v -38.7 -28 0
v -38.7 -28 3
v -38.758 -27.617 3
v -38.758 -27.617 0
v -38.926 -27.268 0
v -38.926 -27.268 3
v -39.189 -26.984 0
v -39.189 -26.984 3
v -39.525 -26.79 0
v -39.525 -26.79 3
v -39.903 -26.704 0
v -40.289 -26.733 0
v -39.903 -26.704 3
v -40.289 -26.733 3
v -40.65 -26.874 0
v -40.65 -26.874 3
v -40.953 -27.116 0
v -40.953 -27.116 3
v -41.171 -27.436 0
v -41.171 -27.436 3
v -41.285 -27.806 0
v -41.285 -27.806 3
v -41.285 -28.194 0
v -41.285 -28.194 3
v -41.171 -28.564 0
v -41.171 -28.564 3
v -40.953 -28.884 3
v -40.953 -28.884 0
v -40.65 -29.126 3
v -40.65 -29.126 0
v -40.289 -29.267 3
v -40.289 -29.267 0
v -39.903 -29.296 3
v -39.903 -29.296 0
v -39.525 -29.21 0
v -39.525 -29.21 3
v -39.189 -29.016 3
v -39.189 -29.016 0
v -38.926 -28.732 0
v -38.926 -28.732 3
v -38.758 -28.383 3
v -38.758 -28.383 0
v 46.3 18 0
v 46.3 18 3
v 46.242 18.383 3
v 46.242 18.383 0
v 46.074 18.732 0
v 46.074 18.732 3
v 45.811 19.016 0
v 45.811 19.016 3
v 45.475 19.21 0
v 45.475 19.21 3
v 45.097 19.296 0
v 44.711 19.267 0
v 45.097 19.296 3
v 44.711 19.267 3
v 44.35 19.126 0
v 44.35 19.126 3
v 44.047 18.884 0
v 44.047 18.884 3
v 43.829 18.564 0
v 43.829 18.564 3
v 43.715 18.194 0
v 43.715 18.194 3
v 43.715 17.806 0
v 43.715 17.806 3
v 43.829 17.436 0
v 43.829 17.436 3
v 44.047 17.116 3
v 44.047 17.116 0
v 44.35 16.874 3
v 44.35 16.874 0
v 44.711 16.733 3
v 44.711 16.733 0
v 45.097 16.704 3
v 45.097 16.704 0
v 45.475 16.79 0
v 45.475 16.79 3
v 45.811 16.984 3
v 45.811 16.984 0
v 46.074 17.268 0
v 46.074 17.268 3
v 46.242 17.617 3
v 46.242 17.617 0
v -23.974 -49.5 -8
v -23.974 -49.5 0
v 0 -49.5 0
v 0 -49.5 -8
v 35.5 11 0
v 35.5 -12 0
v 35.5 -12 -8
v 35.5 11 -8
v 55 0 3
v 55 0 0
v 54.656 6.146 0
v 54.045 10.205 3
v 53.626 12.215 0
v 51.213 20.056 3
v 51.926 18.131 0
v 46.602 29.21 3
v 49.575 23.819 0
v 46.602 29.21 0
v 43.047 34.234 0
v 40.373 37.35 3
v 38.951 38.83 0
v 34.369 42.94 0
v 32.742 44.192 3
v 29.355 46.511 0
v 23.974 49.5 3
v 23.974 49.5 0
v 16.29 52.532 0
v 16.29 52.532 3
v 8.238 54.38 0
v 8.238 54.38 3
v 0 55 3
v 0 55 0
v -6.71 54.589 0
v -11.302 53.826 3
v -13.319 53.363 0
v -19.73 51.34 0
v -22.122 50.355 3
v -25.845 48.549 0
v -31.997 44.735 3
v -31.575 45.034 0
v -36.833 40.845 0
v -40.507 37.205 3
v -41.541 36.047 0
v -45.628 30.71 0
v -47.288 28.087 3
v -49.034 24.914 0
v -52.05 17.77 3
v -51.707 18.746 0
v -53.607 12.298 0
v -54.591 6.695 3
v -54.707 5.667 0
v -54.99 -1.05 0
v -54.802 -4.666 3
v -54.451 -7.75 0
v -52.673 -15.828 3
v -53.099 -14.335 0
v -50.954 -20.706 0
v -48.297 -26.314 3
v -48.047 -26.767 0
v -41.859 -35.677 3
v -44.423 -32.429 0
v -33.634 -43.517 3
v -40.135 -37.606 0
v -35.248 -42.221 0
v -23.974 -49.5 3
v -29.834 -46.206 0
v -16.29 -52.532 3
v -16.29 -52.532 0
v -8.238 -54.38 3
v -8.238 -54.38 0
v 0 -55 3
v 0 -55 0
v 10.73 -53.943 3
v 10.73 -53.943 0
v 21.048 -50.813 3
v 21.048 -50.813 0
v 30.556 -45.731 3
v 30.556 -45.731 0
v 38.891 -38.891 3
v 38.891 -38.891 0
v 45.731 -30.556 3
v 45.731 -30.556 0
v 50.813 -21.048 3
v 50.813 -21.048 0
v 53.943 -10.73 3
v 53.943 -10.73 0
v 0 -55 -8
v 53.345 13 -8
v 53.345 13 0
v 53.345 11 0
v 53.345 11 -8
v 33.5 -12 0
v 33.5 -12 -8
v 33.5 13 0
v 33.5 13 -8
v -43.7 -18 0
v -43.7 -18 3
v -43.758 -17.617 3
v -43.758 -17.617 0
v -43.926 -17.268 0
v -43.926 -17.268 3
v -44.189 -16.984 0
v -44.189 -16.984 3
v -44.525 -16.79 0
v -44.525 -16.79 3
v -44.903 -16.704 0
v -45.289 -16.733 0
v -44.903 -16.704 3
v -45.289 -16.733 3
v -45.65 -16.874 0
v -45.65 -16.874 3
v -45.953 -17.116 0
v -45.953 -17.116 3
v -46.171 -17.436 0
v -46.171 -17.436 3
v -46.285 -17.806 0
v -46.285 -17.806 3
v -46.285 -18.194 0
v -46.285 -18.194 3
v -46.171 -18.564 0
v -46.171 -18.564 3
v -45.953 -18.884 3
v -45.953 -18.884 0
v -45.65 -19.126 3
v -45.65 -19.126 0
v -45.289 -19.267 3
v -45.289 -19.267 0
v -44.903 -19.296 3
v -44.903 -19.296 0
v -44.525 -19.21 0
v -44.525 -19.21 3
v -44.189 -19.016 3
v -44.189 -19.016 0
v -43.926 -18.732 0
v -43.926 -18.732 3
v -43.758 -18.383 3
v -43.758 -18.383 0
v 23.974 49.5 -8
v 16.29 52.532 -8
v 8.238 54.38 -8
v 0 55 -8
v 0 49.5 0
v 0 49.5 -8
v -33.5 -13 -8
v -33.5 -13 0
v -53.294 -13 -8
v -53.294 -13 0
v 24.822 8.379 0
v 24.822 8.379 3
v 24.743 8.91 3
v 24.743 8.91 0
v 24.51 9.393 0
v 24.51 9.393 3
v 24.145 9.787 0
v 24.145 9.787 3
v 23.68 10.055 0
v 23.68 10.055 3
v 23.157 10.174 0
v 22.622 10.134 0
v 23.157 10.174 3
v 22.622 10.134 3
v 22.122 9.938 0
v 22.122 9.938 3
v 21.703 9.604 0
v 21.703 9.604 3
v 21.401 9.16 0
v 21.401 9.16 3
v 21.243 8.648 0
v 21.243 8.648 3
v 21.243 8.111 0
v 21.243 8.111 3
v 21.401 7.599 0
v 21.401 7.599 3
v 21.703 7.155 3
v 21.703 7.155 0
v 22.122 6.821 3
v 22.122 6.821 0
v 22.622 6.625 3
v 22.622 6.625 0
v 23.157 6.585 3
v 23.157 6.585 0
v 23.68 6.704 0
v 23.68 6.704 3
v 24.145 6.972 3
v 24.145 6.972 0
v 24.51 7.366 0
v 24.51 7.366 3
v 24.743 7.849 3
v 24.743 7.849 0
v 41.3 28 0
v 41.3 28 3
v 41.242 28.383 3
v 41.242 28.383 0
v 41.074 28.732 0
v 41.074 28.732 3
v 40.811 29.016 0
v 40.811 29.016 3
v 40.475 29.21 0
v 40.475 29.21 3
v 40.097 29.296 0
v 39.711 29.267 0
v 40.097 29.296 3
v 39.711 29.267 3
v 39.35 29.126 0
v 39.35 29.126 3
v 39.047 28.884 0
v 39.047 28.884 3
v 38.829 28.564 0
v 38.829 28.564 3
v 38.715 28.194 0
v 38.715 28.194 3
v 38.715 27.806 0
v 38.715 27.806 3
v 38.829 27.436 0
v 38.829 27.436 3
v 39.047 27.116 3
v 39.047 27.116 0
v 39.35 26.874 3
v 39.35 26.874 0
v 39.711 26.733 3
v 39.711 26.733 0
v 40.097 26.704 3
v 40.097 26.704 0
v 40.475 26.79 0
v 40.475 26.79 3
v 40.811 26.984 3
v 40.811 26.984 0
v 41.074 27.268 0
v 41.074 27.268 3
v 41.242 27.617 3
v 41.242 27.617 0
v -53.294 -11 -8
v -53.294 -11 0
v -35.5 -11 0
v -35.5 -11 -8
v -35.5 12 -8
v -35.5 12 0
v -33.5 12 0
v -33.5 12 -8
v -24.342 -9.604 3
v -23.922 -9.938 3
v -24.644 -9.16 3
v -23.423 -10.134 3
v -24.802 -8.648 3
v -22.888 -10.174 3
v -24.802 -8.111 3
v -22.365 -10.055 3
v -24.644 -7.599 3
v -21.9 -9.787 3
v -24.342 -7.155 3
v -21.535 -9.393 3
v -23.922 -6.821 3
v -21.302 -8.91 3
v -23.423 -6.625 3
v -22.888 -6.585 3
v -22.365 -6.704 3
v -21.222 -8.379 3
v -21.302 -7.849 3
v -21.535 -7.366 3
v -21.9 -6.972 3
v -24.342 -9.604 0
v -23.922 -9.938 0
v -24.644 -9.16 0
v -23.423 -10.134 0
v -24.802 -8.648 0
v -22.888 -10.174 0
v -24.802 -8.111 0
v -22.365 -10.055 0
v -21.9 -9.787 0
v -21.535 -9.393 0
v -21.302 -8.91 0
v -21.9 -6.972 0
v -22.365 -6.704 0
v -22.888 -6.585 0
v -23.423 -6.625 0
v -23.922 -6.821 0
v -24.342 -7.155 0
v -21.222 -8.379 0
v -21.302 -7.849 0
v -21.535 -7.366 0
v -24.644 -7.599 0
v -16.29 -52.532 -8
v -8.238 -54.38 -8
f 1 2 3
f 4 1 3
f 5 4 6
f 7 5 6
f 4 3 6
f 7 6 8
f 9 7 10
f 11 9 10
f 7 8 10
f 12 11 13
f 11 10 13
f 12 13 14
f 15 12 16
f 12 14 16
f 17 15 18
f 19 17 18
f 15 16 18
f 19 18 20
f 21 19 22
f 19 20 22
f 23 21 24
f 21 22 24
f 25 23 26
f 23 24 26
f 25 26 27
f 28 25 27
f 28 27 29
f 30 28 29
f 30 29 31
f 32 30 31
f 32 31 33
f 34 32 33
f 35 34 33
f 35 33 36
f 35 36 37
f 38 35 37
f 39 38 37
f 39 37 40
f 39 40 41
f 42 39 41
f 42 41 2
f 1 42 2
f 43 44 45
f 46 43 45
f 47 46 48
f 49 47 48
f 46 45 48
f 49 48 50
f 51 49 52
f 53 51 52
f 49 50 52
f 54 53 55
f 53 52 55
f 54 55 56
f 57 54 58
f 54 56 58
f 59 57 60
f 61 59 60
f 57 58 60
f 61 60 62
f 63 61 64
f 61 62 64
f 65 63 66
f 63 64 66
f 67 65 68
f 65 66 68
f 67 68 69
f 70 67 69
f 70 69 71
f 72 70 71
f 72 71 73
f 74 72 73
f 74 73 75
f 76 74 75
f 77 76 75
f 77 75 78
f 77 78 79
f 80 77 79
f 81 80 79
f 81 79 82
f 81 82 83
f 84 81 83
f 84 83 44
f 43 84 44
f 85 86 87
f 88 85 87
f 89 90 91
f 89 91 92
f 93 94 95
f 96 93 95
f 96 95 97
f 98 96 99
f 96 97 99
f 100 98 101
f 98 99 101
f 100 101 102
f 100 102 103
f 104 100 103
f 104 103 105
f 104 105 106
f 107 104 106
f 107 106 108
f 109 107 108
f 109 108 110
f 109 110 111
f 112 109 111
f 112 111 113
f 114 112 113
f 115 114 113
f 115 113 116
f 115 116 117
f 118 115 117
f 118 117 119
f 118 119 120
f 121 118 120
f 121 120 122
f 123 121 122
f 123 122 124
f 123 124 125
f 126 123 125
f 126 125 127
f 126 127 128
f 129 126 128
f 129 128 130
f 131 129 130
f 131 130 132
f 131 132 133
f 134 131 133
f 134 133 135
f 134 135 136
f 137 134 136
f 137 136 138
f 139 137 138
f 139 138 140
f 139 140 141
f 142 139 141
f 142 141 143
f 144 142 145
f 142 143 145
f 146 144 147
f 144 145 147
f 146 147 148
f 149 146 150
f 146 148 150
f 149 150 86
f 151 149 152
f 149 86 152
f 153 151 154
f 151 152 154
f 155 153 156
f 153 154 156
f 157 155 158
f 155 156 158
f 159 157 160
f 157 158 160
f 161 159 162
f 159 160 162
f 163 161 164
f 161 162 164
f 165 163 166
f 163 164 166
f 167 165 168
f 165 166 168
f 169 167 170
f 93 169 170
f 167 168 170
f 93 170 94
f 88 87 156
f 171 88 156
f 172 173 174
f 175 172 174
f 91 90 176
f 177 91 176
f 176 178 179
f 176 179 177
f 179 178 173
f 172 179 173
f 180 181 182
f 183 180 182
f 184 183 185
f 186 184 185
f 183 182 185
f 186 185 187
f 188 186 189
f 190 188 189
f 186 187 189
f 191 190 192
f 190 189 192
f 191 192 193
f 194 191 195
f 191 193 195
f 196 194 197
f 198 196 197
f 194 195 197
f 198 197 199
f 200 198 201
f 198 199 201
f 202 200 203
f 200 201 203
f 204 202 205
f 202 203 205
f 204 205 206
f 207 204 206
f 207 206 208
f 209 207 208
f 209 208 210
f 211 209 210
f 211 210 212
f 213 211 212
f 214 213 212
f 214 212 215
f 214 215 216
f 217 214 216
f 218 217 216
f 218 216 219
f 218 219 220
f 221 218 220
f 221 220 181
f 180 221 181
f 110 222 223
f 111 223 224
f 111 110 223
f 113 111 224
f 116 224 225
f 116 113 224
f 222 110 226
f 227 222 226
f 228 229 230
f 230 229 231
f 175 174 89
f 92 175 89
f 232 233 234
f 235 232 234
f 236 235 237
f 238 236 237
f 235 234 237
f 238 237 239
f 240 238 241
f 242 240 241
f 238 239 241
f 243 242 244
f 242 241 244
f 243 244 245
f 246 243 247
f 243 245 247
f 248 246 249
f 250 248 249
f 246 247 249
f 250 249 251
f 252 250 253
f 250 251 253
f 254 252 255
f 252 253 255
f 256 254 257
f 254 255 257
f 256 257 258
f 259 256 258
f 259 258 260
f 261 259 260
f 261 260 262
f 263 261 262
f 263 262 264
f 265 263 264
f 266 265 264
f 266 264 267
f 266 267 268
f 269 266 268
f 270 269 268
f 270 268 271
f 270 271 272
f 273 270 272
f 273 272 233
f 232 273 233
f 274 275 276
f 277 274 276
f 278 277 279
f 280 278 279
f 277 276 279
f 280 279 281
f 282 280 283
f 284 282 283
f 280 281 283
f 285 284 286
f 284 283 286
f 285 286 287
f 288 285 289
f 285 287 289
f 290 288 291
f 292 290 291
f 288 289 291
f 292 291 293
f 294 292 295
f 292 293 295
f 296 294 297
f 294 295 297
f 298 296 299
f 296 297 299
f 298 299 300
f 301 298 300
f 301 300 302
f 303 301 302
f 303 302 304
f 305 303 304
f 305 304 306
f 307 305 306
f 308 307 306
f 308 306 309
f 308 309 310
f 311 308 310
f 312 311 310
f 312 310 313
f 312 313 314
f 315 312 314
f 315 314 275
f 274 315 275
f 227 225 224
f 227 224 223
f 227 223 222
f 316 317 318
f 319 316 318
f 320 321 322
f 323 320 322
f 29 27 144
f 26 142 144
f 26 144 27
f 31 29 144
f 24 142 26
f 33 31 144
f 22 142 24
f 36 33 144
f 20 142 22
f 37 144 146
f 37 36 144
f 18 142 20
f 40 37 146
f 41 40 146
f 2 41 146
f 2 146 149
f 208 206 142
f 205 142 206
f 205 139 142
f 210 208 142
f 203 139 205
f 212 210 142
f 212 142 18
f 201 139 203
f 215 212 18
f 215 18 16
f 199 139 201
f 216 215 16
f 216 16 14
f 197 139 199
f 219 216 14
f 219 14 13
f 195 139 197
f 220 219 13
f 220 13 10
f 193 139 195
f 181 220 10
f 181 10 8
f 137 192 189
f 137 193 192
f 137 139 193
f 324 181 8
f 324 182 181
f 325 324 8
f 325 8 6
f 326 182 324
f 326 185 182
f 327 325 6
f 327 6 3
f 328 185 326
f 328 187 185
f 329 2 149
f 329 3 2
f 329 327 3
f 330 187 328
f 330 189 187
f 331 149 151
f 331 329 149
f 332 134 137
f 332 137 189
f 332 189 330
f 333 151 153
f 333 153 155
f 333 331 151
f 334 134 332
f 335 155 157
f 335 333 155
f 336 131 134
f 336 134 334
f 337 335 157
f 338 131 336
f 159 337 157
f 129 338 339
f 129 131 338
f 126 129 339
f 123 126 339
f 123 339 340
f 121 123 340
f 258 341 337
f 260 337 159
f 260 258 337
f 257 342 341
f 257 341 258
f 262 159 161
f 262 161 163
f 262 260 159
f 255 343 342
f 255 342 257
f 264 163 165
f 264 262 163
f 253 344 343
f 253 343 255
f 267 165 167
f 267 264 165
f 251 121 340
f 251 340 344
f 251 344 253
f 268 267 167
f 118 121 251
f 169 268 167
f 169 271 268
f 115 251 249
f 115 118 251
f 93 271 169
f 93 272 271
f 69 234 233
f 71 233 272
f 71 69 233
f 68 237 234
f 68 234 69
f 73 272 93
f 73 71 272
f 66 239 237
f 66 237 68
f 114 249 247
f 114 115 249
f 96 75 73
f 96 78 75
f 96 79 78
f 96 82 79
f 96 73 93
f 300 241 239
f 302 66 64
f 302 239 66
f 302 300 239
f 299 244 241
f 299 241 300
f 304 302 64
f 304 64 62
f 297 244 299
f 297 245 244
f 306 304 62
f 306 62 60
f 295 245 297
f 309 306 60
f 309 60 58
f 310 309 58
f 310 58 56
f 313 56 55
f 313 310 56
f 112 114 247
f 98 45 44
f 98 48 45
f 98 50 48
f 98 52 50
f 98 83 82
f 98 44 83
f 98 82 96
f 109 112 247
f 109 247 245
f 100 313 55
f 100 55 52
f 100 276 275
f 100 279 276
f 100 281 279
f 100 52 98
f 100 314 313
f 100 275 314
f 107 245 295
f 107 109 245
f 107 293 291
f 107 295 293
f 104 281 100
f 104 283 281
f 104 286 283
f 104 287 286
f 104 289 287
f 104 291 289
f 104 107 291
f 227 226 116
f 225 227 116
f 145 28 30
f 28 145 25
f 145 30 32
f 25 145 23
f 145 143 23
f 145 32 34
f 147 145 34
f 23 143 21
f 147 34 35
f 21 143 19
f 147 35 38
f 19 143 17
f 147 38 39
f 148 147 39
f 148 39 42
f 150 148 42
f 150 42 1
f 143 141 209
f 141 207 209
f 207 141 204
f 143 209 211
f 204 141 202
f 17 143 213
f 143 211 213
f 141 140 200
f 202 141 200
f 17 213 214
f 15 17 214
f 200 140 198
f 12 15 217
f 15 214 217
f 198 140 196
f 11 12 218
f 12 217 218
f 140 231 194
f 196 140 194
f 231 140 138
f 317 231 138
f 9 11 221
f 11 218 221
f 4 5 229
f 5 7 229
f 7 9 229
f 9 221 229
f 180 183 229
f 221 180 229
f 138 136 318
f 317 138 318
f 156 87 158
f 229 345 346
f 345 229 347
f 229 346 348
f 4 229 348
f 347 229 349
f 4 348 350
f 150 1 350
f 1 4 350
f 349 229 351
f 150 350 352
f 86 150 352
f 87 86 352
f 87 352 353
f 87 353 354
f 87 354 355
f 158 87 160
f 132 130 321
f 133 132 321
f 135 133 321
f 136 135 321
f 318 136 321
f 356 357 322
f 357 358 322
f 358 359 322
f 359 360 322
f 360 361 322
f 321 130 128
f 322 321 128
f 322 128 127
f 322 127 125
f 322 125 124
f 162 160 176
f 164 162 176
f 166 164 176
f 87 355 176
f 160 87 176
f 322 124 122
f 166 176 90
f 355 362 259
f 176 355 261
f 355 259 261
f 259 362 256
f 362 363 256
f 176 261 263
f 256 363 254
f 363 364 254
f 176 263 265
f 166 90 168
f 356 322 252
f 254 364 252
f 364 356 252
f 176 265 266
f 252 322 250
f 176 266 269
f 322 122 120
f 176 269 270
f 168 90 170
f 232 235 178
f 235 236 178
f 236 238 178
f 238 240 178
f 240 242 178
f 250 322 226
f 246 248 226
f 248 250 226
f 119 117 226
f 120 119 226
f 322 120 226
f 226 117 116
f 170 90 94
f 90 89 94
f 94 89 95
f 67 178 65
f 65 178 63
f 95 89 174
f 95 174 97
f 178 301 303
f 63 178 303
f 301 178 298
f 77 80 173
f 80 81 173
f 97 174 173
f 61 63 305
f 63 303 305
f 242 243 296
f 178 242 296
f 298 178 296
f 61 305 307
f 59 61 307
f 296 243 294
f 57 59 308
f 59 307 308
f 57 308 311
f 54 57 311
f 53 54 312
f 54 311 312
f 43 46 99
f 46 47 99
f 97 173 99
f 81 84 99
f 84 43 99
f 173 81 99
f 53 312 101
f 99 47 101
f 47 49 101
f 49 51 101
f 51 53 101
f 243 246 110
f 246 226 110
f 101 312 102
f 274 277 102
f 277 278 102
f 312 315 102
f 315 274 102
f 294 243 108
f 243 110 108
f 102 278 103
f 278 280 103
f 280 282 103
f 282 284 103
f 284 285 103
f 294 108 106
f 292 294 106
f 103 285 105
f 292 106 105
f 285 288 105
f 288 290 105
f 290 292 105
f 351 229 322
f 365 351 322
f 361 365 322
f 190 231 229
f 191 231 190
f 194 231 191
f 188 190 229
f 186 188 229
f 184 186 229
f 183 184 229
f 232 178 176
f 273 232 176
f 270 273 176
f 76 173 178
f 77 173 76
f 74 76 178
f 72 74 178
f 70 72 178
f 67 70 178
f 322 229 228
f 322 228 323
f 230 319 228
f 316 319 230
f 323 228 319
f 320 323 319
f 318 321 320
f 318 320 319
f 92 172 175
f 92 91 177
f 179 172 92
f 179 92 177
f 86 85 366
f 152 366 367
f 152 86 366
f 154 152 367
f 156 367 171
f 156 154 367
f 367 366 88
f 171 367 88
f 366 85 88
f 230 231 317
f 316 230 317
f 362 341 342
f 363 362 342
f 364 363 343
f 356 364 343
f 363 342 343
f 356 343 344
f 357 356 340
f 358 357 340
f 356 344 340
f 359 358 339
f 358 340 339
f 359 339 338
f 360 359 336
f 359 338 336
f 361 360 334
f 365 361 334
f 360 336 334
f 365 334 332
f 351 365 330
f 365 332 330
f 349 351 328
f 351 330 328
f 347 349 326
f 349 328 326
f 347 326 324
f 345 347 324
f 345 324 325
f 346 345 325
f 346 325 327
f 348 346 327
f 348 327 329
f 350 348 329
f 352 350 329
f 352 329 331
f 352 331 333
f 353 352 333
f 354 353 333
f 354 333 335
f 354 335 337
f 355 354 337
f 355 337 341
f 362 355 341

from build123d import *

# Parameters (mm, degrees)
SKETCH_R      = 55
PAD_DEPTH     = 3
SKETCH003_R   = 1.3
SKETCH003_R_2 = 1.8
POCKET_DEPTH  = 5
PAD001_DEPTH  = 11
PAD002_DEPTH  = 11


with BuildPart() as part:
    # Sketch → Pad (new body)
    with BuildSketch(Plane.XY):
        Circle(SKETCH_R)
    extrude(amount=PAD_DEPTH)

    # Sketch003 → Pocket (cut)
    with BuildSketch(Plane.XY.offset(3)):
        with Locations((-45, -18)):
            Circle(SKETCH003_R)
        with Locations((45, 18)):
            Circle(SKETCH003_R)
        with Locations((-40, -28)):
            Circle(SKETCH003_R)
        with Locations((40, 28)):
            Circle(SKETCH003_R)
        with Locations((-23.022469, -8.379494)):
            Circle(SKETCH003_R_2)
        with Locations((23.022469, 8.379494)):
            Circle(SKETCH003_R_2)
    extrude(amount=-POCKET_DEPTH, mode=Mode.SUBTRACT)

    # Sketch001 (on Face3 of Pad) → Pad001 (join)
    with BuildSketch(Plane.XY.offset(3)):
        Polygon((33.500008, 0), (33.500008, 13), (53.345406, 13), (53.345406, 11), (35.5, 11), (35.5, -0.005684), (35.5, -12), (33.500008, -12), align=None)
        Polygon((-33.5, 0), (-33.5, -13), (-53.293575, -13), (-53.293575, -11), (-35.5, -11), (-35.5, 0.001212), (-35.5, 12), (-33.5, 12), align=None)
    extrude(amount=-PAD001_DEPTH)

    # Sketch002 → Pad002 (join)
    with BuildSketch(Plane.XY.offset(3)):
        with BuildLine():
            ThreePointArc((-23.973944, -49.5), (-12.298374, -53.607369), (0, -55))
            Line((0, -49.5), (0, -55))
            Line((-23.973944, -49.5), (0, -49.5))
        make_face()
        with BuildLine():
            ThreePointArc((23.973944, 49.5), (12.298374, 53.607369), (0, 55))
            Line((0, 49.5), (0, 55))
            Line((23.973944, 49.5), (0, 49.5))
        make_face()
    extrude(amount=-PAD002_DEPTH)


solid = part.part
